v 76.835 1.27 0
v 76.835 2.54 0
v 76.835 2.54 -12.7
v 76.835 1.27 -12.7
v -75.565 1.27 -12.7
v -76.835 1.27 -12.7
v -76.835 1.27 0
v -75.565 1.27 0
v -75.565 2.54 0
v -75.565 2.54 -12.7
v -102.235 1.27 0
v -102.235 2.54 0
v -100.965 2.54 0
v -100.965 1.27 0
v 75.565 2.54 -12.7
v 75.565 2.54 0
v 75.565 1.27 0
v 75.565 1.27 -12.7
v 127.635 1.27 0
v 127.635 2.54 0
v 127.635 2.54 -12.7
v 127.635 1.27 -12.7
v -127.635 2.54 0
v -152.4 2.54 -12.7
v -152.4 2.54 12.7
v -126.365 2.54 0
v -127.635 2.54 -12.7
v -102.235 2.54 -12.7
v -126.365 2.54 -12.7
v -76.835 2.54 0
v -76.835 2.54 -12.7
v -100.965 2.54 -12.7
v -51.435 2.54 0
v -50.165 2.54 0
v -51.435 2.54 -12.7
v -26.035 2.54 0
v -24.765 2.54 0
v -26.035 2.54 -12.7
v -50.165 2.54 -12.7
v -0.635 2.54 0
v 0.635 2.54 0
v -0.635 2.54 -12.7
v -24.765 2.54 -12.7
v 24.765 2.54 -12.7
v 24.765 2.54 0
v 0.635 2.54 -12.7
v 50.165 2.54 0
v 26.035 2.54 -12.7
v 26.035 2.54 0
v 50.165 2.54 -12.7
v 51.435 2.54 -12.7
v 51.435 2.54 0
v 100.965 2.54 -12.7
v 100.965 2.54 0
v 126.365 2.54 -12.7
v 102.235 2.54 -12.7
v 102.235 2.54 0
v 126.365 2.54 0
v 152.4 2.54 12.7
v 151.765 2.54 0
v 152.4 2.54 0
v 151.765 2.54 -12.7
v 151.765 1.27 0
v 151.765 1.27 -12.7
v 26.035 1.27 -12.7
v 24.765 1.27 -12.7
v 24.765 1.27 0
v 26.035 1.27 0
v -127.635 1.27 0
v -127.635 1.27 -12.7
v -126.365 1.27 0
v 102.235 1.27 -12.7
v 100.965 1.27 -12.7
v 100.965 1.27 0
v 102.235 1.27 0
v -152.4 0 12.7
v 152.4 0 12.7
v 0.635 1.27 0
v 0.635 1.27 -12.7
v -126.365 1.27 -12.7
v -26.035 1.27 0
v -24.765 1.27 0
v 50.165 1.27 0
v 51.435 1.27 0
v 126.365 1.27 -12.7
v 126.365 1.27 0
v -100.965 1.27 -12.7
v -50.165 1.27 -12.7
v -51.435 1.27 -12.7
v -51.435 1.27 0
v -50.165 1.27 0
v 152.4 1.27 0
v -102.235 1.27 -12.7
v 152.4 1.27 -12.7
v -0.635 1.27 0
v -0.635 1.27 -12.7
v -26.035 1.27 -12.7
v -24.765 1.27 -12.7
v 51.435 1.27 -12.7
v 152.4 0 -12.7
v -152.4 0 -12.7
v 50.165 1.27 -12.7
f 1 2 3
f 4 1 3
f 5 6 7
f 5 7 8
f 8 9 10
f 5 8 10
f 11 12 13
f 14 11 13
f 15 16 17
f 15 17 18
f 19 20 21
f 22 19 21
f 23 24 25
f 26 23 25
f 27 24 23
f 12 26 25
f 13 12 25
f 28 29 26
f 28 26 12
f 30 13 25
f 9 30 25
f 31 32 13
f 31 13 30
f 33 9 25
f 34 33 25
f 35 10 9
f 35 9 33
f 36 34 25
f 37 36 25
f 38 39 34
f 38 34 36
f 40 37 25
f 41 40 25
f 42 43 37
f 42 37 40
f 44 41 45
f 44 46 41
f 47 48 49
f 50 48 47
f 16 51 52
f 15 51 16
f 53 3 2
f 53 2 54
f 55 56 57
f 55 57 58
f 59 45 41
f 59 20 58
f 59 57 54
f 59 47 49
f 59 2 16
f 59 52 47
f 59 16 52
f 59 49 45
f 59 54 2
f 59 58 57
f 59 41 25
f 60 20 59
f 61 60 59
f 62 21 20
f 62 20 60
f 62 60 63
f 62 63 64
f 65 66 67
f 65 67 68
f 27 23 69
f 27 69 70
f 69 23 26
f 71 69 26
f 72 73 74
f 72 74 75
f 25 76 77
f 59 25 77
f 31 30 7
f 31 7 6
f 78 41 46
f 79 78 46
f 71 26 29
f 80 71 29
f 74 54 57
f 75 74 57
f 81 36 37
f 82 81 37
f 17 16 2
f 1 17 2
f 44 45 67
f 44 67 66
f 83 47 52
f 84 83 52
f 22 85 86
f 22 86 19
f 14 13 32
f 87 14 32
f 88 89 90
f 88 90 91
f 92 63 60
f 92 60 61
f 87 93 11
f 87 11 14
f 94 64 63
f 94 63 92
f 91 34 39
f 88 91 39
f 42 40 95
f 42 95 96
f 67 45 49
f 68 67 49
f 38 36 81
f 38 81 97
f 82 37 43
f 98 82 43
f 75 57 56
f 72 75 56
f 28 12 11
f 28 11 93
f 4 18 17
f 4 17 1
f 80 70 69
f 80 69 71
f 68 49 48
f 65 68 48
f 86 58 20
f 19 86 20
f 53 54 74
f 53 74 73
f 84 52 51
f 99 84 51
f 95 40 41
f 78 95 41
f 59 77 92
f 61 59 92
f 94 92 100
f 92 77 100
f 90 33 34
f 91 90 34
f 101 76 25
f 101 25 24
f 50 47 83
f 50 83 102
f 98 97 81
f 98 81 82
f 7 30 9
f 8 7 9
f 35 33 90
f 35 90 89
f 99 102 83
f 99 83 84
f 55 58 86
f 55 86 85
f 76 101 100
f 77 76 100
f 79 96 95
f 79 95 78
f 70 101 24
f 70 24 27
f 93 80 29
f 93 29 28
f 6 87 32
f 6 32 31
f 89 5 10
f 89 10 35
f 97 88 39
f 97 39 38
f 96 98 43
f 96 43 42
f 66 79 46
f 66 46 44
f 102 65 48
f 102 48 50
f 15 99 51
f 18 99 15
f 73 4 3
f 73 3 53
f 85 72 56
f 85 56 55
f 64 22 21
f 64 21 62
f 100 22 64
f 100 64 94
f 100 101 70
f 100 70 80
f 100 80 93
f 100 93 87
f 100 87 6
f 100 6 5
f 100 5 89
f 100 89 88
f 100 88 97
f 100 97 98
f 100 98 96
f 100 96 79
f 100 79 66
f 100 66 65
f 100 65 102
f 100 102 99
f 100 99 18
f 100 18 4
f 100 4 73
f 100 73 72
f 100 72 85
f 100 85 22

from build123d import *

# Parameters (mm, degrees)
SKETCH1_W           = 304.8
SKETCH1_H           = 25.4
BOSS_EXTRUDE1_DEPTH = 2.54
SKETCH2_W           = 0.635
SKETCH2_H           = 12.7
CUT_EXTRUDE1_DEPTH  = 1.27


with BuildPart() as part:
    # Sketch1 → Boss-Extrude1 (new body)
    with BuildSketch(Plane(origin=(0, 0, 0), x_dir=(1, 0, 0), z_dir=(0, 1, 0))):
        Rectangle(SKETCH1_W, SKETCH1_H)
    extrude(amount=BOSS_EXTRUDE1_DEPTH)

    # Sketch2 → Cut-Extrude1 (cut)
    with BuildSketch(Plane(origin=(0, 2.54, 0), x_dir=(1, 0, 0), z_dir=(0, 1, 0))):
        with Locations((-127.3175, 6.35)):
            Rectangle(SKETCH2_W, SKETCH2_H)
        with Locations((-126.6825, 6.35)):
            Rectangle(SKETCH2_W, SKETCH2_H)
        with Locations((-101.9175, 6.35)):
            Rectangle(SKETCH2_W, SKETCH2_H)
        with Locations((-101.2825, 6.35)):
            Rectangle(SKETCH2_W, SKETCH2_H)
        with Locations((-75.8825, 6.35)):
            Rectangle(SKETCH2_W, SKETCH2_H)
        with Locations((-76.5175, 6.35)):
            Rectangle(SKETCH2_W, SKETCH2_H)
        with Locations((-51.1175, 6.35)):
            Rectangle(SKETCH2_W, SKETCH2_H)
        with Locations((-50.4825, 6.35)):
            Rectangle(SKETCH2_W, SKETCH2_H)
        with Locations((-25.7175, 6.35)):
            Rectangle(SKETCH2_W, SKETCH2_H)
        with Locations((-25.0825, 6.35)):
            Rectangle(SKETCH2_W, SKETCH2_H)
        with Locations((-0.3175, 6.35)):
            Rectangle(SKETCH2_W, SKETCH2_H)
        with Locations((0.3175, 6.35)):
            Rectangle(SKETCH2_W, SKETCH2_H)
        with Locations((25.0825, 6.35)):
            Rectangle(SKETCH2_W, SKETCH2_H)
        with Locations((25.7175, 6.35)):
            Rectangle(SKETCH2_W, SKETCH2_H)
        with Locations((50.4825, 6.35)):
            Rectangle(SKETCH2_W, SKETCH2_H)
        with Locations((51.1175, 6.35)):
            Rectangle(SKETCH2_W, SKETCH2_H)
        with Locations((75.8825, 6.35)):
            Rectangle(SKETCH2_W, SKETCH2_H)
        with Locations((76.5175, 6.35)):
            Rectangle(SKETCH2_W, SKETCH2_H)
        with Locations((101.2825, 6.35)):
            Rectangle(SKETCH2_W, SKETCH2_H)
        with Locations((101.9175, 6.35)):
            Rectangle(SKETCH2_W, SKETCH2_H)
        with Locations((126.6825, 6.35)):
            Rectangle(SKETCH2_W, SKETCH2_H)
        with Locations((127.3175, 6.35)):
            Rectangle(SKETCH2_W, SKETCH2_H)
        with Locations((152.0825, 6.35)):
            Rectangle(SKETCH2_W, SKETCH2_H)
    extrude(amount=-CUT_EXTRUDE1_DEPTH, mode=Mode.SUBTRACT)


solid = part.part
